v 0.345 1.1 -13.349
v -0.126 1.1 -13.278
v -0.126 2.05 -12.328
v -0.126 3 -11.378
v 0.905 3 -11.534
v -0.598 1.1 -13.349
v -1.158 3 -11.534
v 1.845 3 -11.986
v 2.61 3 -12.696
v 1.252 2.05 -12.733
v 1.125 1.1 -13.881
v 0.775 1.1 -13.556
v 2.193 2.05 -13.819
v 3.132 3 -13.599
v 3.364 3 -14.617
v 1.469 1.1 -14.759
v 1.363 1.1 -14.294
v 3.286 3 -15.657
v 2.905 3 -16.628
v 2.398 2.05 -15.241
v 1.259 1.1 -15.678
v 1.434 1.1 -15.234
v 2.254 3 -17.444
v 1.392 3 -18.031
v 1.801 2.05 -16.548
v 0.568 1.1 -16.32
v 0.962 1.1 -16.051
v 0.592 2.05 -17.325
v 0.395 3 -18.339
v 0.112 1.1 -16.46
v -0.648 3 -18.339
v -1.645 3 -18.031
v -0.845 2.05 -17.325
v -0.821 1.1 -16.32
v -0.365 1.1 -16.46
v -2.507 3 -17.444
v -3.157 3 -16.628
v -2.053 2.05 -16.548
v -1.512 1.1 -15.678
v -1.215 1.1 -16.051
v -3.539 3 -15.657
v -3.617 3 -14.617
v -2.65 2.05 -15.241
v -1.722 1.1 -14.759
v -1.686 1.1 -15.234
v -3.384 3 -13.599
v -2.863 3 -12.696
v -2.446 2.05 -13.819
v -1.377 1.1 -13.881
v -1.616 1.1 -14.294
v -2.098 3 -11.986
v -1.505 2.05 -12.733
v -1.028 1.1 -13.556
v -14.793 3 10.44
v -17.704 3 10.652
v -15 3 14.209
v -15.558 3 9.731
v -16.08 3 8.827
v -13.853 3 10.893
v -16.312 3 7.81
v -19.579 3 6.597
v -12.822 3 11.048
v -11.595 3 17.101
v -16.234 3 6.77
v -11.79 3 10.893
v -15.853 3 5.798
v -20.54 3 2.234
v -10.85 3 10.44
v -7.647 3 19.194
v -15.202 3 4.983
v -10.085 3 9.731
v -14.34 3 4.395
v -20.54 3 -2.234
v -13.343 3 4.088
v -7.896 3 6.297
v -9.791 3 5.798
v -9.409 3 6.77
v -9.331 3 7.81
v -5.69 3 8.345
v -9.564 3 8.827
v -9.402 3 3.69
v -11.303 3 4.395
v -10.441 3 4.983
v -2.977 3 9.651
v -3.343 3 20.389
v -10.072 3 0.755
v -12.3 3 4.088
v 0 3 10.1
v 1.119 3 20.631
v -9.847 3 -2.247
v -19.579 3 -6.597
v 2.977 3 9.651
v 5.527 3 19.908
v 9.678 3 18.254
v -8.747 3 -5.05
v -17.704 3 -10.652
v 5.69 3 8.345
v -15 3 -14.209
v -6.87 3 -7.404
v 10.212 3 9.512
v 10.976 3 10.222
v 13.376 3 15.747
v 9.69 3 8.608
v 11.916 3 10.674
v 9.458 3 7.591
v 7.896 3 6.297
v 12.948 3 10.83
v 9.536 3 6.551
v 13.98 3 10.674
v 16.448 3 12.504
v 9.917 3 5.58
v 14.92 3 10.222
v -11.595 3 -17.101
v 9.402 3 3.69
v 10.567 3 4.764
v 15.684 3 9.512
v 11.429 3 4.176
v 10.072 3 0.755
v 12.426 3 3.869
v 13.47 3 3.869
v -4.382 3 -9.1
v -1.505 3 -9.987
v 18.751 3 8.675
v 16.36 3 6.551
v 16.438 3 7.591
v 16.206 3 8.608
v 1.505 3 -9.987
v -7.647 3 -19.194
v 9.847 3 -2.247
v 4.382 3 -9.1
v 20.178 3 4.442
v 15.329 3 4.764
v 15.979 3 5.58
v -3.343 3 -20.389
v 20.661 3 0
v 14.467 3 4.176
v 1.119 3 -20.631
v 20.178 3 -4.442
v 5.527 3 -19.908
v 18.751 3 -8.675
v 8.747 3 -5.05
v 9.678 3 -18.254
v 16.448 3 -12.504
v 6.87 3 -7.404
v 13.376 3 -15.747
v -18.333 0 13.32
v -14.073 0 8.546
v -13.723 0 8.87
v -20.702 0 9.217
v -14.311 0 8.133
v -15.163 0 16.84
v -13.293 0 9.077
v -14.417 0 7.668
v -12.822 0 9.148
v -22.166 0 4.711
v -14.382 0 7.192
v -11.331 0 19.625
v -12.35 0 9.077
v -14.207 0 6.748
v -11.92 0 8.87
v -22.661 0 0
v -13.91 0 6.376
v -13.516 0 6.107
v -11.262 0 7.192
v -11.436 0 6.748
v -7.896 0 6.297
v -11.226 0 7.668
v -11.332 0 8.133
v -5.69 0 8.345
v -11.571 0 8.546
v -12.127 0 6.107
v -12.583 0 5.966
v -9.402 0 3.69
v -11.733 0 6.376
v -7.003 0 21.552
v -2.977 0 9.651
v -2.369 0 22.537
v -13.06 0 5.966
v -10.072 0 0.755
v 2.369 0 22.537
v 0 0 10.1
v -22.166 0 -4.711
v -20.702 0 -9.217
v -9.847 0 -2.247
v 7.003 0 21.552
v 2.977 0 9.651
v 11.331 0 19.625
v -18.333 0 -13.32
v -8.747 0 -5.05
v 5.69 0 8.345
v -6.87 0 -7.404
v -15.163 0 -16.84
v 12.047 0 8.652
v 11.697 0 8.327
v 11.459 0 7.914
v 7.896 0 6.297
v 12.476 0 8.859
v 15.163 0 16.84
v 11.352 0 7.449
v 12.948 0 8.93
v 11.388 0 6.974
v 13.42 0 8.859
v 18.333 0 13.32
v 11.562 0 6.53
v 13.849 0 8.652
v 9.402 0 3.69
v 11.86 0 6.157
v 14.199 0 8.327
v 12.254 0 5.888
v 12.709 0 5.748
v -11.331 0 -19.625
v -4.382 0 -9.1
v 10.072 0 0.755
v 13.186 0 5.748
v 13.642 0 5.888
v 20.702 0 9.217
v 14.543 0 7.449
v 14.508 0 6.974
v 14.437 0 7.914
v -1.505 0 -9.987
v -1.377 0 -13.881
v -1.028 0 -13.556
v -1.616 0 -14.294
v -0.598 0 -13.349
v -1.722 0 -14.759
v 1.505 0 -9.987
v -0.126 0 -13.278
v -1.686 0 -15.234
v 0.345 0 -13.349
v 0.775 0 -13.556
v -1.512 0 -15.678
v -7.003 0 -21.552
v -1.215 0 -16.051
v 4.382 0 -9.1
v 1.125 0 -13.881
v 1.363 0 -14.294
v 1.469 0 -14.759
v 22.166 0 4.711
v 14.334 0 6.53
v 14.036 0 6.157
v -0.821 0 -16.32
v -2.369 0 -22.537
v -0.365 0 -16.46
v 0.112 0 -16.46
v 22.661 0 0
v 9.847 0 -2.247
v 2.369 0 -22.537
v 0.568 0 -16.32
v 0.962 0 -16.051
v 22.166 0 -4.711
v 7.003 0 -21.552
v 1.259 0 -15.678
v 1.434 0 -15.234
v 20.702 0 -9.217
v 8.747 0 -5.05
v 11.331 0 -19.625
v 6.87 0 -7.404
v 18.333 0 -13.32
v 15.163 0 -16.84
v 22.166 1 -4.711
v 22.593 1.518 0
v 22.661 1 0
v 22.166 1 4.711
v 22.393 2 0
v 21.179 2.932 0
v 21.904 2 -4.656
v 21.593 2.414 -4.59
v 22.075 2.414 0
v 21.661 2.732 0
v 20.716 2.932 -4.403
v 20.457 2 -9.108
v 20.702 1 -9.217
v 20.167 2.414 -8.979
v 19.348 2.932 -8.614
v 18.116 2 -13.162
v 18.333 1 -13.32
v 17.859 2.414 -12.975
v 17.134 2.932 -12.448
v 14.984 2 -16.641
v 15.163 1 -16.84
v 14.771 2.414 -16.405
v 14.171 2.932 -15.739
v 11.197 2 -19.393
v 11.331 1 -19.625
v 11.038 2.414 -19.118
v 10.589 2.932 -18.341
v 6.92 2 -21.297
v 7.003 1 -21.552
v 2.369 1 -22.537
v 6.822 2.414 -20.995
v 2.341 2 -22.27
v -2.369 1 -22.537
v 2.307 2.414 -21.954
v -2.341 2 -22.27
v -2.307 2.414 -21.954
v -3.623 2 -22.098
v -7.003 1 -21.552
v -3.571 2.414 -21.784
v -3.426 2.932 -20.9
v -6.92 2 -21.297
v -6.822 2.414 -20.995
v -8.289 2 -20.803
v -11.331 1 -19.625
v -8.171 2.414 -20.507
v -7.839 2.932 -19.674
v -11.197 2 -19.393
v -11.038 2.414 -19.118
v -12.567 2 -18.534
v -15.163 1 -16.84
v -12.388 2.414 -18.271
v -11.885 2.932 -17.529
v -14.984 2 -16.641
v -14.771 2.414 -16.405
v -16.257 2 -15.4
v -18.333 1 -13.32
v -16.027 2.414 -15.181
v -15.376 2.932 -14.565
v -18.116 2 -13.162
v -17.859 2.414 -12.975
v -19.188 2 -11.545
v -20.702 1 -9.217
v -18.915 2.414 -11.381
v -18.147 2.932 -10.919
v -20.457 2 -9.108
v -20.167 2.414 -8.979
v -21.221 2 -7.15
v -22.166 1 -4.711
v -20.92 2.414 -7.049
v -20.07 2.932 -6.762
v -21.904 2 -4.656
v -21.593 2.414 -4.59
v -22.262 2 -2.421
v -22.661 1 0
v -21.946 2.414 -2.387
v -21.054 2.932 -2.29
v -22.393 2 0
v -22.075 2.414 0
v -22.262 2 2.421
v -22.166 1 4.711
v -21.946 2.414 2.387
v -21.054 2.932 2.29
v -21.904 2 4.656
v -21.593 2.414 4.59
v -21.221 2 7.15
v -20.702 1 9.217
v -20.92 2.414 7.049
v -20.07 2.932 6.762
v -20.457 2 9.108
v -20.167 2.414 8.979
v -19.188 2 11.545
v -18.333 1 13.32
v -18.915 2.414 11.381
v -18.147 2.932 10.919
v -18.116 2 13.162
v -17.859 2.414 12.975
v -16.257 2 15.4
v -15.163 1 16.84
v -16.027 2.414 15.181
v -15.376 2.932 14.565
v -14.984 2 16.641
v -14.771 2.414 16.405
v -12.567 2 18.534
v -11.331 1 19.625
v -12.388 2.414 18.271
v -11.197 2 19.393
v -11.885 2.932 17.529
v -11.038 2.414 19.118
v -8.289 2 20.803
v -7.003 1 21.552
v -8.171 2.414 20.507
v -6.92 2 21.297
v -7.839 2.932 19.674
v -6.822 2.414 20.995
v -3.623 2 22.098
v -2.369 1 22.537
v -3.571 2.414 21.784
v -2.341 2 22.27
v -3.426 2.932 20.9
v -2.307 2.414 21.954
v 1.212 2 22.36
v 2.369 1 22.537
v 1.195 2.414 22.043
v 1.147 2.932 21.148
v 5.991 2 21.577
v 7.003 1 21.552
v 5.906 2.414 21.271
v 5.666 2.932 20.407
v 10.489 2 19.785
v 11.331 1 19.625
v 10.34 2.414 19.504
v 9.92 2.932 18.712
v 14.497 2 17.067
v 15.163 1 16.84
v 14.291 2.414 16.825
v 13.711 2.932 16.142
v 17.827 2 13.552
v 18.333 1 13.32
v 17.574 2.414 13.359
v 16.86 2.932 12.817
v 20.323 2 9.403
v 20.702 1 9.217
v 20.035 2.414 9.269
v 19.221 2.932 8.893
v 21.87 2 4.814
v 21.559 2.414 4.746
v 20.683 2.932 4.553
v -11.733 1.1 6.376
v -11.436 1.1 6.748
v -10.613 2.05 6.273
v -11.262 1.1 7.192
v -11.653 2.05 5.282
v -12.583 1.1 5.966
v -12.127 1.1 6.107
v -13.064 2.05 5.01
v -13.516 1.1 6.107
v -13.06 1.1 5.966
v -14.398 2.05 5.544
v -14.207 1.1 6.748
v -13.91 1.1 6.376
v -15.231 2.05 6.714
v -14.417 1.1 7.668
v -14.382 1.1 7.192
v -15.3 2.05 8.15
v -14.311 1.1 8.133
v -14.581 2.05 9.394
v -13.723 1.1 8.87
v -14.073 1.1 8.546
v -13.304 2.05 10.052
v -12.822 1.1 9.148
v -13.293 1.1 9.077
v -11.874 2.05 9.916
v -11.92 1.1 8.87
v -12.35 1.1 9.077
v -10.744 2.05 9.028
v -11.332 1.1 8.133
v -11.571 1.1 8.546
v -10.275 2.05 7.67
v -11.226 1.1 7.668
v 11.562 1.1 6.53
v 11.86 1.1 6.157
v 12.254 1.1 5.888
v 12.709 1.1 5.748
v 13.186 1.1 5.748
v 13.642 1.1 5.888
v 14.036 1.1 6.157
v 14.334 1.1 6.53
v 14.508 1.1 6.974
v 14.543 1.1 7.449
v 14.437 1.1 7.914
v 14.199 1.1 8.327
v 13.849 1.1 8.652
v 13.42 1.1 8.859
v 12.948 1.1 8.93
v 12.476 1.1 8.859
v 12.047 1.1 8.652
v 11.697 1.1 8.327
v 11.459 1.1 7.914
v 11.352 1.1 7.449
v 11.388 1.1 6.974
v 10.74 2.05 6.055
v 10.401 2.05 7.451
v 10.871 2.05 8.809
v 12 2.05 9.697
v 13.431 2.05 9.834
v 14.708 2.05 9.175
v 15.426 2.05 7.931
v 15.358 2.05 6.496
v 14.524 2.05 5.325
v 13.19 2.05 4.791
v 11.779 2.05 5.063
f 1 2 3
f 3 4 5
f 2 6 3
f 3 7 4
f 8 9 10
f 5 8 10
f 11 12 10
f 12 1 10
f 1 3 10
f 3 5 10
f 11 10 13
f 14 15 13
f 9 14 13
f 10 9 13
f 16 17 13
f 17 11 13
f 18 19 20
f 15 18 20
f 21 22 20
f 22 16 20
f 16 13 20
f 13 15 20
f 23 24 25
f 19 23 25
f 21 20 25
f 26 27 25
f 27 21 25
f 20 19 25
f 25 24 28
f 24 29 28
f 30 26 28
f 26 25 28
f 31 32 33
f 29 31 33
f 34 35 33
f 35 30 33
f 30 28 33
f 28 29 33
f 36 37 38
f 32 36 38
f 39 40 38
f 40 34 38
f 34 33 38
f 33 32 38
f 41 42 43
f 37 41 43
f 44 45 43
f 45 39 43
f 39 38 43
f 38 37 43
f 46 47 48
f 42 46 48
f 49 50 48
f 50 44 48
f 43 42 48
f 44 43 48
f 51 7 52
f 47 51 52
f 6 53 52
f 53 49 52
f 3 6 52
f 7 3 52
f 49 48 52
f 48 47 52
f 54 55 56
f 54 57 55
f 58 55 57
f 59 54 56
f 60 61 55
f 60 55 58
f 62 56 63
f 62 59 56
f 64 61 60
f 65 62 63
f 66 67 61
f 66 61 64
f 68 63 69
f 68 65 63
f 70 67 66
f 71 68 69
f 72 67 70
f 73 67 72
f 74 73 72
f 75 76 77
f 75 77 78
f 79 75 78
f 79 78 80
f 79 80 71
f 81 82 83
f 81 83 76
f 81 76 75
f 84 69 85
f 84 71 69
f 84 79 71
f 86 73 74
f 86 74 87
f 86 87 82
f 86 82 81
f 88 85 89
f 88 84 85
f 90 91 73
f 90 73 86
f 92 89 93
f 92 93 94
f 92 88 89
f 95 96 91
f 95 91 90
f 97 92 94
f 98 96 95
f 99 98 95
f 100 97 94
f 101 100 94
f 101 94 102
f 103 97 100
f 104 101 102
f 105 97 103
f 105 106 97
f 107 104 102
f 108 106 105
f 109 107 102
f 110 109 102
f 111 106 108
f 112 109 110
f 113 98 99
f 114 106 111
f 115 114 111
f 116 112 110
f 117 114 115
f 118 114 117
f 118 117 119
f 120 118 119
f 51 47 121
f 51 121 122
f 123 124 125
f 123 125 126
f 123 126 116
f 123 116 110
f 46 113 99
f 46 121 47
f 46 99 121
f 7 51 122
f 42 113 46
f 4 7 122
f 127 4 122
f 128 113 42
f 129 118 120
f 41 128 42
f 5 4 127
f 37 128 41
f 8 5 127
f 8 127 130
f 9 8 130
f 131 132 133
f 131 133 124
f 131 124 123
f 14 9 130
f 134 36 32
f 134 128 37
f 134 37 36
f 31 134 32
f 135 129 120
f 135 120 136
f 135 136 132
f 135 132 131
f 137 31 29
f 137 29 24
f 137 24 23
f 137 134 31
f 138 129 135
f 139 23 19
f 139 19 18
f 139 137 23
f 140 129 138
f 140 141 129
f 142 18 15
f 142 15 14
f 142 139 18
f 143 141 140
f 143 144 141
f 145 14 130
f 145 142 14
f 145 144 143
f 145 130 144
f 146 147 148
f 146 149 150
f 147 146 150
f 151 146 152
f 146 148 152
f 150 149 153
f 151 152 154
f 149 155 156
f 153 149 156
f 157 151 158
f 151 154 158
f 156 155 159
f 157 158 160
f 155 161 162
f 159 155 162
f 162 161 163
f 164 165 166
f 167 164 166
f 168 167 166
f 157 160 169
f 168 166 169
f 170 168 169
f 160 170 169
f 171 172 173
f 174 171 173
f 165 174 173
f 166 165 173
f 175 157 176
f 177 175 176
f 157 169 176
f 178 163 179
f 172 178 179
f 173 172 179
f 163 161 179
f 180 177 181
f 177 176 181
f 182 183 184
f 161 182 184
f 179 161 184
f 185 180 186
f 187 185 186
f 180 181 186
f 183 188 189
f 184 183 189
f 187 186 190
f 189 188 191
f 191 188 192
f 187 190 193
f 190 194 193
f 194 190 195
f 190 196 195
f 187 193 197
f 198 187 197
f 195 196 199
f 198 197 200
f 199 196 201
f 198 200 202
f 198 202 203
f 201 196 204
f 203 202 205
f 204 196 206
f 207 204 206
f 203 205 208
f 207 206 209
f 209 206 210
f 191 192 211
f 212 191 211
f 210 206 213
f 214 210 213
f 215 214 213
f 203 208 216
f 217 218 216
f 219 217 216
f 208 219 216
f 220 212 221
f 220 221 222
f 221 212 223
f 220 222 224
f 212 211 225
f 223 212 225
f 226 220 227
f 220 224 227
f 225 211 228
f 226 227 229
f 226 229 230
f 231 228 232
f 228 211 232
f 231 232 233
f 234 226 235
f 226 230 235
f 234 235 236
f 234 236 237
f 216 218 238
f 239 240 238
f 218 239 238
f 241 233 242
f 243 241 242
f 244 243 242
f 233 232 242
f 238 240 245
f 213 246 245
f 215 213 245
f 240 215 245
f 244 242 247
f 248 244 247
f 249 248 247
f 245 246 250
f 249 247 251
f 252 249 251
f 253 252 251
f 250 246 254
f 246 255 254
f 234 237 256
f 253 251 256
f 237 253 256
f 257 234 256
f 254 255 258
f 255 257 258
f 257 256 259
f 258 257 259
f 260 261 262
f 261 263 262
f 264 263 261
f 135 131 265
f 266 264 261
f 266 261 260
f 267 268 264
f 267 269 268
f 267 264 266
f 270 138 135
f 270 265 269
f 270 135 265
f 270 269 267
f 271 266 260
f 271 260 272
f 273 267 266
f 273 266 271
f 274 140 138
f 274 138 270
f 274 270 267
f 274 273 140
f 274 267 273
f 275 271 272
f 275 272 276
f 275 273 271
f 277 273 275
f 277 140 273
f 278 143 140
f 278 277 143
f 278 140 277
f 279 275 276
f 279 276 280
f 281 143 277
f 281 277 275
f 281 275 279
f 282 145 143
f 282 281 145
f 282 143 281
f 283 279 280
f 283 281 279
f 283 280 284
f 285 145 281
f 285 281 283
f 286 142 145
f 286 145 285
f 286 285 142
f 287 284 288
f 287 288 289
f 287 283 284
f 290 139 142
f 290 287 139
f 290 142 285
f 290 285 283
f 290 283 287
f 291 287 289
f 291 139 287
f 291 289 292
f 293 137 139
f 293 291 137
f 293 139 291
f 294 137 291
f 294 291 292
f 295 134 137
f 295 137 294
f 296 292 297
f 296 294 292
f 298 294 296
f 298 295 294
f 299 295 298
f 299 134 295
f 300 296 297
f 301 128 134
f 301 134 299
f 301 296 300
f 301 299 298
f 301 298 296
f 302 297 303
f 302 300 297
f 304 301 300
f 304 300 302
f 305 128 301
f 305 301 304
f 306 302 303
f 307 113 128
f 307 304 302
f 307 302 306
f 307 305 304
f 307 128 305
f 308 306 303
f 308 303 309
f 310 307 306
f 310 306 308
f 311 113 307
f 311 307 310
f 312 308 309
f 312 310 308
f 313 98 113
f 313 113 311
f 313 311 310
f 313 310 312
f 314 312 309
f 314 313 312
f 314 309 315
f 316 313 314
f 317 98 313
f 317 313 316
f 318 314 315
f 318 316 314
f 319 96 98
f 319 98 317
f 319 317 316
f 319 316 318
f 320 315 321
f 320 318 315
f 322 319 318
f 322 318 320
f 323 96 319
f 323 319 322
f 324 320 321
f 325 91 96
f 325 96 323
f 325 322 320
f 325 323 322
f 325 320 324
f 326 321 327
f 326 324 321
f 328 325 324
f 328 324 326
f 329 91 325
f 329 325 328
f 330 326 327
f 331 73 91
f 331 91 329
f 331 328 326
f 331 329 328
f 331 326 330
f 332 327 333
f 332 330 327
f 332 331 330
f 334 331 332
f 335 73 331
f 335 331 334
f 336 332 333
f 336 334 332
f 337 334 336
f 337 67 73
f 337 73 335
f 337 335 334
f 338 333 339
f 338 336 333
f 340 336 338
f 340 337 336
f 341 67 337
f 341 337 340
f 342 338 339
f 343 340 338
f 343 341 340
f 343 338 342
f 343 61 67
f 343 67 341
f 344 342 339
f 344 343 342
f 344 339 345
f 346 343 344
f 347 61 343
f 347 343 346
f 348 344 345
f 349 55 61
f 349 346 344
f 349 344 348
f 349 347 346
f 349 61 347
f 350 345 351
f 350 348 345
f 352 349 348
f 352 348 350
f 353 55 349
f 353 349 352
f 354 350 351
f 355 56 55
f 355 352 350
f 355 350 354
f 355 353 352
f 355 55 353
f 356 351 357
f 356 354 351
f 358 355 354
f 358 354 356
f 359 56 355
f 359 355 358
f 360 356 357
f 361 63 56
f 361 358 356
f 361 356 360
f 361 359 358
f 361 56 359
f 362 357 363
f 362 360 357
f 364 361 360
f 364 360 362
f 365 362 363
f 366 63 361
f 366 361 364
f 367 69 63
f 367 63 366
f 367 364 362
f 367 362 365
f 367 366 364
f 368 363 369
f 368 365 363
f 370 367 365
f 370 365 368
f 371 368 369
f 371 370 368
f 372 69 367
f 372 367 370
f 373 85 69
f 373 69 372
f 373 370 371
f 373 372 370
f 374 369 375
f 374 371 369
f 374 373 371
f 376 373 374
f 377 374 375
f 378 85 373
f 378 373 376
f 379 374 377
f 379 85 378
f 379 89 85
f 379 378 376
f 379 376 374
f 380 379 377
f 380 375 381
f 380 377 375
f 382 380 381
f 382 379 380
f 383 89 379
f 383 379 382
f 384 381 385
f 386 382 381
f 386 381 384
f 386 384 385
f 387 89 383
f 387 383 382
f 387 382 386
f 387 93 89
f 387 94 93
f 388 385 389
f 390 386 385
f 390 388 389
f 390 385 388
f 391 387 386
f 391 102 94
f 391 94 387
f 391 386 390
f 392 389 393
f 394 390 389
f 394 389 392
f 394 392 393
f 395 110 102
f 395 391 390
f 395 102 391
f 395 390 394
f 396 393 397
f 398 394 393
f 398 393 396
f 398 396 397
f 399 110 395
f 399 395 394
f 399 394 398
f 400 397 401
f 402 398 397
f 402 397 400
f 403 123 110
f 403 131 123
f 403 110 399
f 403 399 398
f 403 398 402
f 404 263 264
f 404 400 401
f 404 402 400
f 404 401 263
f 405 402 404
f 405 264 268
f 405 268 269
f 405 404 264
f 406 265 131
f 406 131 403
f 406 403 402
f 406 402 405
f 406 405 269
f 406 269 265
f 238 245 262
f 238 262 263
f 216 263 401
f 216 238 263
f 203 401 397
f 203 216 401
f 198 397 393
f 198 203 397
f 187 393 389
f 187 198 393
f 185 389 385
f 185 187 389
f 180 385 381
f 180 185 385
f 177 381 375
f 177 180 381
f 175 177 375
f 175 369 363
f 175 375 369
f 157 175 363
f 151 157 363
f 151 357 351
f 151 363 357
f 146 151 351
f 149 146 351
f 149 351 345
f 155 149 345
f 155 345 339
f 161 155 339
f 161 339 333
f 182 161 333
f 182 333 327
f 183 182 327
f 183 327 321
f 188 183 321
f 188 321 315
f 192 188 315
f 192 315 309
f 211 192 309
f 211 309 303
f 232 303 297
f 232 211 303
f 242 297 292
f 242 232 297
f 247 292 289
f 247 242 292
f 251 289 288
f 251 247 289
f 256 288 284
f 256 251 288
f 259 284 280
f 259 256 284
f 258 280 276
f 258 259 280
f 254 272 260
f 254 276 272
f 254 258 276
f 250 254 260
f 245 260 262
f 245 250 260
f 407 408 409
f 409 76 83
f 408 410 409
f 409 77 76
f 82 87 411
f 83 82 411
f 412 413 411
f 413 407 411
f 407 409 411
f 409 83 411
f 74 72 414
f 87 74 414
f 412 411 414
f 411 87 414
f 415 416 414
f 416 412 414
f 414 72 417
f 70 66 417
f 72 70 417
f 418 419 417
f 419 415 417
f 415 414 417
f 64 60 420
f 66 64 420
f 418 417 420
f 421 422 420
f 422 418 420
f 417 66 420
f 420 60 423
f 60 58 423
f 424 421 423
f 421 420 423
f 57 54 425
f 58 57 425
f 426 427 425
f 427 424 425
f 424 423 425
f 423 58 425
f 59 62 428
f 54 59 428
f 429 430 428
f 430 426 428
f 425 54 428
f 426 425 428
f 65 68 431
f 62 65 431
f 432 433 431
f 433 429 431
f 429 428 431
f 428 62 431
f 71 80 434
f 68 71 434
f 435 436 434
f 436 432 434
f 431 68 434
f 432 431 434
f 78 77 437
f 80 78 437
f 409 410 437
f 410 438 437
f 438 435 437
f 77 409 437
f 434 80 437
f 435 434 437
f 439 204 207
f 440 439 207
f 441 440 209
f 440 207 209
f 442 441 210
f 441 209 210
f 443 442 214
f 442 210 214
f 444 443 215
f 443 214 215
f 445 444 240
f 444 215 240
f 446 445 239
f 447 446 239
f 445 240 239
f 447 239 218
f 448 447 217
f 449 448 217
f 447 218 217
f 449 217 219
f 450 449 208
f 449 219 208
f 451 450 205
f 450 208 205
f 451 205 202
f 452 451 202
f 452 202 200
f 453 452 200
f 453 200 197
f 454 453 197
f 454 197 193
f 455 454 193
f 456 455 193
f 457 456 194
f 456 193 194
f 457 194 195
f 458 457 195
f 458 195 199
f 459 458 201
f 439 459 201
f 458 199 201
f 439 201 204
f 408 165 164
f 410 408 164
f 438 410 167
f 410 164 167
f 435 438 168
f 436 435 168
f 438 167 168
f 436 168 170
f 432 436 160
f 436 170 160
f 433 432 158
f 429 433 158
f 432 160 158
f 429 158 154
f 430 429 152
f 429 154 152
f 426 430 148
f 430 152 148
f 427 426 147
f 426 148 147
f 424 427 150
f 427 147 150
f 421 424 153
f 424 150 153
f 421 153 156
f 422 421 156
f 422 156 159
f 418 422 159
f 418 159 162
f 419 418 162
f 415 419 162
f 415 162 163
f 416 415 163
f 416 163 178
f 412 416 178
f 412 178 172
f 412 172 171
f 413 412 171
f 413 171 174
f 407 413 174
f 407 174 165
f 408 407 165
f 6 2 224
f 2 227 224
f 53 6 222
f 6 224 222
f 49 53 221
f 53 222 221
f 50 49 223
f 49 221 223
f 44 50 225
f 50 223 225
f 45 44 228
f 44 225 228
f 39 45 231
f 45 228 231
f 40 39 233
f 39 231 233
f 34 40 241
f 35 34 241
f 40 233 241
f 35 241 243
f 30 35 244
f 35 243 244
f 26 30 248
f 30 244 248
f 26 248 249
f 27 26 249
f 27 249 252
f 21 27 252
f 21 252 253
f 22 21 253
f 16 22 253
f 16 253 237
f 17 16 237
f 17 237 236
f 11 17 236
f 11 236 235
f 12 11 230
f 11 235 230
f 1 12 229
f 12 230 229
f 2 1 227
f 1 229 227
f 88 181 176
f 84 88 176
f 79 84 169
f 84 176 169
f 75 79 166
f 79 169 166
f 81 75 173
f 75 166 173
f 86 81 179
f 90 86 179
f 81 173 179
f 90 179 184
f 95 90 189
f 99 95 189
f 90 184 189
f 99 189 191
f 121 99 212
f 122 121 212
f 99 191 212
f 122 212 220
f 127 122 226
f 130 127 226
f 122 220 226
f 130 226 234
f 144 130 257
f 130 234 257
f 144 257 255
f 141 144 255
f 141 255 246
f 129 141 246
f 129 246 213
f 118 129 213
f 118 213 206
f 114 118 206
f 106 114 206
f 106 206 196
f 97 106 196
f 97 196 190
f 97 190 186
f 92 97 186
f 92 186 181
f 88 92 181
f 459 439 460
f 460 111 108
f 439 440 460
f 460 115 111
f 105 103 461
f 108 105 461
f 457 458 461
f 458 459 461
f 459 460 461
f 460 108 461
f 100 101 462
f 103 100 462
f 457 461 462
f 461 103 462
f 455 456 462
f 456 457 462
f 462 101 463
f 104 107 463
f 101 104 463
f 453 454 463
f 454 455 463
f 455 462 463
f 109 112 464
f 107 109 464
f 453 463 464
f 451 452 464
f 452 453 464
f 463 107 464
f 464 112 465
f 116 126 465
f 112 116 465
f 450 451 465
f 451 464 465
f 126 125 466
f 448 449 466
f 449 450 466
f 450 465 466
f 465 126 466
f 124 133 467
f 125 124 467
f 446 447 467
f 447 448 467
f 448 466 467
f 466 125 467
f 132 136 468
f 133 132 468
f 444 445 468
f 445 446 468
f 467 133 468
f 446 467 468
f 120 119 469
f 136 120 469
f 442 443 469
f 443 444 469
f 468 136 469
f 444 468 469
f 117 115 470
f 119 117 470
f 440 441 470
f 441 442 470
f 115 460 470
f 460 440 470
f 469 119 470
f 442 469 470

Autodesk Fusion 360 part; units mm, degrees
sketch "Sketch1" plane through (0, 0, 0) normal (0, 1, 0) x (1, 0, 0)
  circle A0 centre (0, 0) radius 22.661
extrude "Extrude1" add sketch "Sketch1" along normal blind 3
hole "Hole1" at (0, 3, 0) direction (0, -1, 0) diameter 20.2 depth 3 tip angle 180
hole "Hole2" at (-0.1263, 3, -14.8781) direction (0, -1, 0) diameter 3.2 depth 30 tip angle 180 countersink diameter 7 countersink angle 90
sketch "Sketch2" plane through (0, 0, 0) normal (0, 1, 0) x (1, 0, 0)
  circle A0 centre (0, 0) radius 15
  dimension "d9" = 30
pattern_circular "C-Pattern1" count 3 over 360 about axis through (0, 0, 0) along (0, 1, 0) of "Hole2"
fillet "Fillet1" radius 2 1 edges at (-21.1274, 3, 8.1946)
